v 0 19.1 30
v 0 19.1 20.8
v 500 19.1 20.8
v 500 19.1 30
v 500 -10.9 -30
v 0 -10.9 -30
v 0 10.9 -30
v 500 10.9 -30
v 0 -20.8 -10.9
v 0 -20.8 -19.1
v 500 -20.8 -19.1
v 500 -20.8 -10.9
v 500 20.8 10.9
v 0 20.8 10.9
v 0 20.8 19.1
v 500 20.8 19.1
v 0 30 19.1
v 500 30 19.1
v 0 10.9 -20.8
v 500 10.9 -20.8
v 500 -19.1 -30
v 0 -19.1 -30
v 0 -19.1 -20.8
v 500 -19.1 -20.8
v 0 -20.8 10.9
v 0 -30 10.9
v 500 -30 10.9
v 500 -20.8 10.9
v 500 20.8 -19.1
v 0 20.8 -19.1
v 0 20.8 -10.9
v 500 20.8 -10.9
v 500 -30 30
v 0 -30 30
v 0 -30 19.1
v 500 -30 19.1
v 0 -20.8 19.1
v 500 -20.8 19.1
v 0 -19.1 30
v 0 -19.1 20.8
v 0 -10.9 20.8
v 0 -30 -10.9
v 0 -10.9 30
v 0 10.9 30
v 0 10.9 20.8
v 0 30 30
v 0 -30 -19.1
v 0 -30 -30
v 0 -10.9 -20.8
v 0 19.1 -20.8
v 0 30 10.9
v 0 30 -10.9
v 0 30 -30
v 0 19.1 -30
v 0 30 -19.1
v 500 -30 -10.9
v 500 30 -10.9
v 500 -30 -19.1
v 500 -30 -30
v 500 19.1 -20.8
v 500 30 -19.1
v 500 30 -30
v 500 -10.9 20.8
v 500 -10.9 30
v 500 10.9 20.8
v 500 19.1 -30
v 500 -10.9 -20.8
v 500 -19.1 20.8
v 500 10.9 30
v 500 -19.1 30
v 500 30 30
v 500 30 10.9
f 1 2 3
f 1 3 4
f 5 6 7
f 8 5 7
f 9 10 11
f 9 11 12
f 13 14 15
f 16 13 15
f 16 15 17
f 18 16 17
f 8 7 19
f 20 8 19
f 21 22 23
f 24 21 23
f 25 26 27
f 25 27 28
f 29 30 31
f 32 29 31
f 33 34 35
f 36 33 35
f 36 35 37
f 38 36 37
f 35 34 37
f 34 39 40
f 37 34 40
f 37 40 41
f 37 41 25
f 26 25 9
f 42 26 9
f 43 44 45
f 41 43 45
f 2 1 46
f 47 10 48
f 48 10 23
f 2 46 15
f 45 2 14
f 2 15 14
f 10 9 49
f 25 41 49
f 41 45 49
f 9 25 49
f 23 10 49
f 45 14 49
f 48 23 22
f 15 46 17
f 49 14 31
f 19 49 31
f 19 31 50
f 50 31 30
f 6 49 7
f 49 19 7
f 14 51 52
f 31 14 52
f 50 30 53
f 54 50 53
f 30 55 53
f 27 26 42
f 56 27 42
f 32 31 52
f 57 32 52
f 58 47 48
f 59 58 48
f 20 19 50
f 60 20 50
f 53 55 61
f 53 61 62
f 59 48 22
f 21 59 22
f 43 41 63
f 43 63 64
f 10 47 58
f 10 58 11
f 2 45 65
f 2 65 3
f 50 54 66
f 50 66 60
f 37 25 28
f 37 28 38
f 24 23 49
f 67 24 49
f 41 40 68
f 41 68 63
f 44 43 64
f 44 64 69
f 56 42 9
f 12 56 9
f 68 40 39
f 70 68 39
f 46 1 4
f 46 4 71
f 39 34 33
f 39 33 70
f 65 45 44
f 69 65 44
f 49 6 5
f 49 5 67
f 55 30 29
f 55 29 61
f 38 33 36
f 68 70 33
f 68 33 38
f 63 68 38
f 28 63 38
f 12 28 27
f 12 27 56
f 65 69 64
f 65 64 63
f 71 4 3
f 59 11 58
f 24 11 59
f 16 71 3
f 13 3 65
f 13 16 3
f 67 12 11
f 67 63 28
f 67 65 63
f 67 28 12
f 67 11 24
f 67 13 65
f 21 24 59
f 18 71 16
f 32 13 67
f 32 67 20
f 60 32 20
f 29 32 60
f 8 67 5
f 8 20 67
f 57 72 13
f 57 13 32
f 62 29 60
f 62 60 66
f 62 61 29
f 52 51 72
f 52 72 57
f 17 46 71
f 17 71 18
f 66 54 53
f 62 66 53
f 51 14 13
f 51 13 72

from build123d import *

# Parameters (mm, degrees)
SKETCH_1_W          = 60
SKETCH_1_H          = 60
EXTRUDE_1_DEPTH     = 500
SKETCH_2_W          = 8.2
SKETCH_2_H          = 9.2
SKETCH_2_W_2        = 9.2
SKETCH_2_H_2        = 8.2
CUT_EXTRUDE_1_DEPTH = 501


with BuildPart() as part:
    # 草图1 → 凸台-拉伸1 (new body)
    with BuildSketch(Plane(origin=(0, 0, 0), x_dir=(0, 0, -1), z_dir=(1, 0, 0))):
        Rectangle(SKETCH_1_W, SKETCH_1_H)
    extrude(amount=EXTRUDE_1_DEPTH)

    # 草图2 → 切除-拉伸1 (cut, through all)
    with BuildSketch(Plane.ZY):
        with Locations((-15, 25.4)):
            Rectangle(SKETCH_2_W, SKETCH_2_H)
        with Locations((-15, -25.4)):
            Rectangle(SKETCH_2_W, SKETCH_2_H)
        with Locations((15, -25.4)):
            Rectangle(SKETCH_2_W, SKETCH_2_H)
        with Locations((15, 25.4)):
            Rectangle(SKETCH_2_W, SKETCH_2_H)
        with Locations((-25.4, 15)):
            Rectangle(SKETCH_2_W_2, SKETCH_2_H_2)
        with Locations((-25.4, -15)):
            Rectangle(SKETCH_2_W_2, SKETCH_2_H_2)
        with Locations((25.4, -15)):
            Rectangle(SKETCH_2_W_2, SKETCH_2_H_2)
        with Locations((25.4, 15)):
            Rectangle(SKETCH_2_W_2, SKETCH_2_H_2)
    extrude(amount=-CUT_EXTRUDE_1_DEPTH, mode=Mode.SUBTRACT)


solid = part.part
